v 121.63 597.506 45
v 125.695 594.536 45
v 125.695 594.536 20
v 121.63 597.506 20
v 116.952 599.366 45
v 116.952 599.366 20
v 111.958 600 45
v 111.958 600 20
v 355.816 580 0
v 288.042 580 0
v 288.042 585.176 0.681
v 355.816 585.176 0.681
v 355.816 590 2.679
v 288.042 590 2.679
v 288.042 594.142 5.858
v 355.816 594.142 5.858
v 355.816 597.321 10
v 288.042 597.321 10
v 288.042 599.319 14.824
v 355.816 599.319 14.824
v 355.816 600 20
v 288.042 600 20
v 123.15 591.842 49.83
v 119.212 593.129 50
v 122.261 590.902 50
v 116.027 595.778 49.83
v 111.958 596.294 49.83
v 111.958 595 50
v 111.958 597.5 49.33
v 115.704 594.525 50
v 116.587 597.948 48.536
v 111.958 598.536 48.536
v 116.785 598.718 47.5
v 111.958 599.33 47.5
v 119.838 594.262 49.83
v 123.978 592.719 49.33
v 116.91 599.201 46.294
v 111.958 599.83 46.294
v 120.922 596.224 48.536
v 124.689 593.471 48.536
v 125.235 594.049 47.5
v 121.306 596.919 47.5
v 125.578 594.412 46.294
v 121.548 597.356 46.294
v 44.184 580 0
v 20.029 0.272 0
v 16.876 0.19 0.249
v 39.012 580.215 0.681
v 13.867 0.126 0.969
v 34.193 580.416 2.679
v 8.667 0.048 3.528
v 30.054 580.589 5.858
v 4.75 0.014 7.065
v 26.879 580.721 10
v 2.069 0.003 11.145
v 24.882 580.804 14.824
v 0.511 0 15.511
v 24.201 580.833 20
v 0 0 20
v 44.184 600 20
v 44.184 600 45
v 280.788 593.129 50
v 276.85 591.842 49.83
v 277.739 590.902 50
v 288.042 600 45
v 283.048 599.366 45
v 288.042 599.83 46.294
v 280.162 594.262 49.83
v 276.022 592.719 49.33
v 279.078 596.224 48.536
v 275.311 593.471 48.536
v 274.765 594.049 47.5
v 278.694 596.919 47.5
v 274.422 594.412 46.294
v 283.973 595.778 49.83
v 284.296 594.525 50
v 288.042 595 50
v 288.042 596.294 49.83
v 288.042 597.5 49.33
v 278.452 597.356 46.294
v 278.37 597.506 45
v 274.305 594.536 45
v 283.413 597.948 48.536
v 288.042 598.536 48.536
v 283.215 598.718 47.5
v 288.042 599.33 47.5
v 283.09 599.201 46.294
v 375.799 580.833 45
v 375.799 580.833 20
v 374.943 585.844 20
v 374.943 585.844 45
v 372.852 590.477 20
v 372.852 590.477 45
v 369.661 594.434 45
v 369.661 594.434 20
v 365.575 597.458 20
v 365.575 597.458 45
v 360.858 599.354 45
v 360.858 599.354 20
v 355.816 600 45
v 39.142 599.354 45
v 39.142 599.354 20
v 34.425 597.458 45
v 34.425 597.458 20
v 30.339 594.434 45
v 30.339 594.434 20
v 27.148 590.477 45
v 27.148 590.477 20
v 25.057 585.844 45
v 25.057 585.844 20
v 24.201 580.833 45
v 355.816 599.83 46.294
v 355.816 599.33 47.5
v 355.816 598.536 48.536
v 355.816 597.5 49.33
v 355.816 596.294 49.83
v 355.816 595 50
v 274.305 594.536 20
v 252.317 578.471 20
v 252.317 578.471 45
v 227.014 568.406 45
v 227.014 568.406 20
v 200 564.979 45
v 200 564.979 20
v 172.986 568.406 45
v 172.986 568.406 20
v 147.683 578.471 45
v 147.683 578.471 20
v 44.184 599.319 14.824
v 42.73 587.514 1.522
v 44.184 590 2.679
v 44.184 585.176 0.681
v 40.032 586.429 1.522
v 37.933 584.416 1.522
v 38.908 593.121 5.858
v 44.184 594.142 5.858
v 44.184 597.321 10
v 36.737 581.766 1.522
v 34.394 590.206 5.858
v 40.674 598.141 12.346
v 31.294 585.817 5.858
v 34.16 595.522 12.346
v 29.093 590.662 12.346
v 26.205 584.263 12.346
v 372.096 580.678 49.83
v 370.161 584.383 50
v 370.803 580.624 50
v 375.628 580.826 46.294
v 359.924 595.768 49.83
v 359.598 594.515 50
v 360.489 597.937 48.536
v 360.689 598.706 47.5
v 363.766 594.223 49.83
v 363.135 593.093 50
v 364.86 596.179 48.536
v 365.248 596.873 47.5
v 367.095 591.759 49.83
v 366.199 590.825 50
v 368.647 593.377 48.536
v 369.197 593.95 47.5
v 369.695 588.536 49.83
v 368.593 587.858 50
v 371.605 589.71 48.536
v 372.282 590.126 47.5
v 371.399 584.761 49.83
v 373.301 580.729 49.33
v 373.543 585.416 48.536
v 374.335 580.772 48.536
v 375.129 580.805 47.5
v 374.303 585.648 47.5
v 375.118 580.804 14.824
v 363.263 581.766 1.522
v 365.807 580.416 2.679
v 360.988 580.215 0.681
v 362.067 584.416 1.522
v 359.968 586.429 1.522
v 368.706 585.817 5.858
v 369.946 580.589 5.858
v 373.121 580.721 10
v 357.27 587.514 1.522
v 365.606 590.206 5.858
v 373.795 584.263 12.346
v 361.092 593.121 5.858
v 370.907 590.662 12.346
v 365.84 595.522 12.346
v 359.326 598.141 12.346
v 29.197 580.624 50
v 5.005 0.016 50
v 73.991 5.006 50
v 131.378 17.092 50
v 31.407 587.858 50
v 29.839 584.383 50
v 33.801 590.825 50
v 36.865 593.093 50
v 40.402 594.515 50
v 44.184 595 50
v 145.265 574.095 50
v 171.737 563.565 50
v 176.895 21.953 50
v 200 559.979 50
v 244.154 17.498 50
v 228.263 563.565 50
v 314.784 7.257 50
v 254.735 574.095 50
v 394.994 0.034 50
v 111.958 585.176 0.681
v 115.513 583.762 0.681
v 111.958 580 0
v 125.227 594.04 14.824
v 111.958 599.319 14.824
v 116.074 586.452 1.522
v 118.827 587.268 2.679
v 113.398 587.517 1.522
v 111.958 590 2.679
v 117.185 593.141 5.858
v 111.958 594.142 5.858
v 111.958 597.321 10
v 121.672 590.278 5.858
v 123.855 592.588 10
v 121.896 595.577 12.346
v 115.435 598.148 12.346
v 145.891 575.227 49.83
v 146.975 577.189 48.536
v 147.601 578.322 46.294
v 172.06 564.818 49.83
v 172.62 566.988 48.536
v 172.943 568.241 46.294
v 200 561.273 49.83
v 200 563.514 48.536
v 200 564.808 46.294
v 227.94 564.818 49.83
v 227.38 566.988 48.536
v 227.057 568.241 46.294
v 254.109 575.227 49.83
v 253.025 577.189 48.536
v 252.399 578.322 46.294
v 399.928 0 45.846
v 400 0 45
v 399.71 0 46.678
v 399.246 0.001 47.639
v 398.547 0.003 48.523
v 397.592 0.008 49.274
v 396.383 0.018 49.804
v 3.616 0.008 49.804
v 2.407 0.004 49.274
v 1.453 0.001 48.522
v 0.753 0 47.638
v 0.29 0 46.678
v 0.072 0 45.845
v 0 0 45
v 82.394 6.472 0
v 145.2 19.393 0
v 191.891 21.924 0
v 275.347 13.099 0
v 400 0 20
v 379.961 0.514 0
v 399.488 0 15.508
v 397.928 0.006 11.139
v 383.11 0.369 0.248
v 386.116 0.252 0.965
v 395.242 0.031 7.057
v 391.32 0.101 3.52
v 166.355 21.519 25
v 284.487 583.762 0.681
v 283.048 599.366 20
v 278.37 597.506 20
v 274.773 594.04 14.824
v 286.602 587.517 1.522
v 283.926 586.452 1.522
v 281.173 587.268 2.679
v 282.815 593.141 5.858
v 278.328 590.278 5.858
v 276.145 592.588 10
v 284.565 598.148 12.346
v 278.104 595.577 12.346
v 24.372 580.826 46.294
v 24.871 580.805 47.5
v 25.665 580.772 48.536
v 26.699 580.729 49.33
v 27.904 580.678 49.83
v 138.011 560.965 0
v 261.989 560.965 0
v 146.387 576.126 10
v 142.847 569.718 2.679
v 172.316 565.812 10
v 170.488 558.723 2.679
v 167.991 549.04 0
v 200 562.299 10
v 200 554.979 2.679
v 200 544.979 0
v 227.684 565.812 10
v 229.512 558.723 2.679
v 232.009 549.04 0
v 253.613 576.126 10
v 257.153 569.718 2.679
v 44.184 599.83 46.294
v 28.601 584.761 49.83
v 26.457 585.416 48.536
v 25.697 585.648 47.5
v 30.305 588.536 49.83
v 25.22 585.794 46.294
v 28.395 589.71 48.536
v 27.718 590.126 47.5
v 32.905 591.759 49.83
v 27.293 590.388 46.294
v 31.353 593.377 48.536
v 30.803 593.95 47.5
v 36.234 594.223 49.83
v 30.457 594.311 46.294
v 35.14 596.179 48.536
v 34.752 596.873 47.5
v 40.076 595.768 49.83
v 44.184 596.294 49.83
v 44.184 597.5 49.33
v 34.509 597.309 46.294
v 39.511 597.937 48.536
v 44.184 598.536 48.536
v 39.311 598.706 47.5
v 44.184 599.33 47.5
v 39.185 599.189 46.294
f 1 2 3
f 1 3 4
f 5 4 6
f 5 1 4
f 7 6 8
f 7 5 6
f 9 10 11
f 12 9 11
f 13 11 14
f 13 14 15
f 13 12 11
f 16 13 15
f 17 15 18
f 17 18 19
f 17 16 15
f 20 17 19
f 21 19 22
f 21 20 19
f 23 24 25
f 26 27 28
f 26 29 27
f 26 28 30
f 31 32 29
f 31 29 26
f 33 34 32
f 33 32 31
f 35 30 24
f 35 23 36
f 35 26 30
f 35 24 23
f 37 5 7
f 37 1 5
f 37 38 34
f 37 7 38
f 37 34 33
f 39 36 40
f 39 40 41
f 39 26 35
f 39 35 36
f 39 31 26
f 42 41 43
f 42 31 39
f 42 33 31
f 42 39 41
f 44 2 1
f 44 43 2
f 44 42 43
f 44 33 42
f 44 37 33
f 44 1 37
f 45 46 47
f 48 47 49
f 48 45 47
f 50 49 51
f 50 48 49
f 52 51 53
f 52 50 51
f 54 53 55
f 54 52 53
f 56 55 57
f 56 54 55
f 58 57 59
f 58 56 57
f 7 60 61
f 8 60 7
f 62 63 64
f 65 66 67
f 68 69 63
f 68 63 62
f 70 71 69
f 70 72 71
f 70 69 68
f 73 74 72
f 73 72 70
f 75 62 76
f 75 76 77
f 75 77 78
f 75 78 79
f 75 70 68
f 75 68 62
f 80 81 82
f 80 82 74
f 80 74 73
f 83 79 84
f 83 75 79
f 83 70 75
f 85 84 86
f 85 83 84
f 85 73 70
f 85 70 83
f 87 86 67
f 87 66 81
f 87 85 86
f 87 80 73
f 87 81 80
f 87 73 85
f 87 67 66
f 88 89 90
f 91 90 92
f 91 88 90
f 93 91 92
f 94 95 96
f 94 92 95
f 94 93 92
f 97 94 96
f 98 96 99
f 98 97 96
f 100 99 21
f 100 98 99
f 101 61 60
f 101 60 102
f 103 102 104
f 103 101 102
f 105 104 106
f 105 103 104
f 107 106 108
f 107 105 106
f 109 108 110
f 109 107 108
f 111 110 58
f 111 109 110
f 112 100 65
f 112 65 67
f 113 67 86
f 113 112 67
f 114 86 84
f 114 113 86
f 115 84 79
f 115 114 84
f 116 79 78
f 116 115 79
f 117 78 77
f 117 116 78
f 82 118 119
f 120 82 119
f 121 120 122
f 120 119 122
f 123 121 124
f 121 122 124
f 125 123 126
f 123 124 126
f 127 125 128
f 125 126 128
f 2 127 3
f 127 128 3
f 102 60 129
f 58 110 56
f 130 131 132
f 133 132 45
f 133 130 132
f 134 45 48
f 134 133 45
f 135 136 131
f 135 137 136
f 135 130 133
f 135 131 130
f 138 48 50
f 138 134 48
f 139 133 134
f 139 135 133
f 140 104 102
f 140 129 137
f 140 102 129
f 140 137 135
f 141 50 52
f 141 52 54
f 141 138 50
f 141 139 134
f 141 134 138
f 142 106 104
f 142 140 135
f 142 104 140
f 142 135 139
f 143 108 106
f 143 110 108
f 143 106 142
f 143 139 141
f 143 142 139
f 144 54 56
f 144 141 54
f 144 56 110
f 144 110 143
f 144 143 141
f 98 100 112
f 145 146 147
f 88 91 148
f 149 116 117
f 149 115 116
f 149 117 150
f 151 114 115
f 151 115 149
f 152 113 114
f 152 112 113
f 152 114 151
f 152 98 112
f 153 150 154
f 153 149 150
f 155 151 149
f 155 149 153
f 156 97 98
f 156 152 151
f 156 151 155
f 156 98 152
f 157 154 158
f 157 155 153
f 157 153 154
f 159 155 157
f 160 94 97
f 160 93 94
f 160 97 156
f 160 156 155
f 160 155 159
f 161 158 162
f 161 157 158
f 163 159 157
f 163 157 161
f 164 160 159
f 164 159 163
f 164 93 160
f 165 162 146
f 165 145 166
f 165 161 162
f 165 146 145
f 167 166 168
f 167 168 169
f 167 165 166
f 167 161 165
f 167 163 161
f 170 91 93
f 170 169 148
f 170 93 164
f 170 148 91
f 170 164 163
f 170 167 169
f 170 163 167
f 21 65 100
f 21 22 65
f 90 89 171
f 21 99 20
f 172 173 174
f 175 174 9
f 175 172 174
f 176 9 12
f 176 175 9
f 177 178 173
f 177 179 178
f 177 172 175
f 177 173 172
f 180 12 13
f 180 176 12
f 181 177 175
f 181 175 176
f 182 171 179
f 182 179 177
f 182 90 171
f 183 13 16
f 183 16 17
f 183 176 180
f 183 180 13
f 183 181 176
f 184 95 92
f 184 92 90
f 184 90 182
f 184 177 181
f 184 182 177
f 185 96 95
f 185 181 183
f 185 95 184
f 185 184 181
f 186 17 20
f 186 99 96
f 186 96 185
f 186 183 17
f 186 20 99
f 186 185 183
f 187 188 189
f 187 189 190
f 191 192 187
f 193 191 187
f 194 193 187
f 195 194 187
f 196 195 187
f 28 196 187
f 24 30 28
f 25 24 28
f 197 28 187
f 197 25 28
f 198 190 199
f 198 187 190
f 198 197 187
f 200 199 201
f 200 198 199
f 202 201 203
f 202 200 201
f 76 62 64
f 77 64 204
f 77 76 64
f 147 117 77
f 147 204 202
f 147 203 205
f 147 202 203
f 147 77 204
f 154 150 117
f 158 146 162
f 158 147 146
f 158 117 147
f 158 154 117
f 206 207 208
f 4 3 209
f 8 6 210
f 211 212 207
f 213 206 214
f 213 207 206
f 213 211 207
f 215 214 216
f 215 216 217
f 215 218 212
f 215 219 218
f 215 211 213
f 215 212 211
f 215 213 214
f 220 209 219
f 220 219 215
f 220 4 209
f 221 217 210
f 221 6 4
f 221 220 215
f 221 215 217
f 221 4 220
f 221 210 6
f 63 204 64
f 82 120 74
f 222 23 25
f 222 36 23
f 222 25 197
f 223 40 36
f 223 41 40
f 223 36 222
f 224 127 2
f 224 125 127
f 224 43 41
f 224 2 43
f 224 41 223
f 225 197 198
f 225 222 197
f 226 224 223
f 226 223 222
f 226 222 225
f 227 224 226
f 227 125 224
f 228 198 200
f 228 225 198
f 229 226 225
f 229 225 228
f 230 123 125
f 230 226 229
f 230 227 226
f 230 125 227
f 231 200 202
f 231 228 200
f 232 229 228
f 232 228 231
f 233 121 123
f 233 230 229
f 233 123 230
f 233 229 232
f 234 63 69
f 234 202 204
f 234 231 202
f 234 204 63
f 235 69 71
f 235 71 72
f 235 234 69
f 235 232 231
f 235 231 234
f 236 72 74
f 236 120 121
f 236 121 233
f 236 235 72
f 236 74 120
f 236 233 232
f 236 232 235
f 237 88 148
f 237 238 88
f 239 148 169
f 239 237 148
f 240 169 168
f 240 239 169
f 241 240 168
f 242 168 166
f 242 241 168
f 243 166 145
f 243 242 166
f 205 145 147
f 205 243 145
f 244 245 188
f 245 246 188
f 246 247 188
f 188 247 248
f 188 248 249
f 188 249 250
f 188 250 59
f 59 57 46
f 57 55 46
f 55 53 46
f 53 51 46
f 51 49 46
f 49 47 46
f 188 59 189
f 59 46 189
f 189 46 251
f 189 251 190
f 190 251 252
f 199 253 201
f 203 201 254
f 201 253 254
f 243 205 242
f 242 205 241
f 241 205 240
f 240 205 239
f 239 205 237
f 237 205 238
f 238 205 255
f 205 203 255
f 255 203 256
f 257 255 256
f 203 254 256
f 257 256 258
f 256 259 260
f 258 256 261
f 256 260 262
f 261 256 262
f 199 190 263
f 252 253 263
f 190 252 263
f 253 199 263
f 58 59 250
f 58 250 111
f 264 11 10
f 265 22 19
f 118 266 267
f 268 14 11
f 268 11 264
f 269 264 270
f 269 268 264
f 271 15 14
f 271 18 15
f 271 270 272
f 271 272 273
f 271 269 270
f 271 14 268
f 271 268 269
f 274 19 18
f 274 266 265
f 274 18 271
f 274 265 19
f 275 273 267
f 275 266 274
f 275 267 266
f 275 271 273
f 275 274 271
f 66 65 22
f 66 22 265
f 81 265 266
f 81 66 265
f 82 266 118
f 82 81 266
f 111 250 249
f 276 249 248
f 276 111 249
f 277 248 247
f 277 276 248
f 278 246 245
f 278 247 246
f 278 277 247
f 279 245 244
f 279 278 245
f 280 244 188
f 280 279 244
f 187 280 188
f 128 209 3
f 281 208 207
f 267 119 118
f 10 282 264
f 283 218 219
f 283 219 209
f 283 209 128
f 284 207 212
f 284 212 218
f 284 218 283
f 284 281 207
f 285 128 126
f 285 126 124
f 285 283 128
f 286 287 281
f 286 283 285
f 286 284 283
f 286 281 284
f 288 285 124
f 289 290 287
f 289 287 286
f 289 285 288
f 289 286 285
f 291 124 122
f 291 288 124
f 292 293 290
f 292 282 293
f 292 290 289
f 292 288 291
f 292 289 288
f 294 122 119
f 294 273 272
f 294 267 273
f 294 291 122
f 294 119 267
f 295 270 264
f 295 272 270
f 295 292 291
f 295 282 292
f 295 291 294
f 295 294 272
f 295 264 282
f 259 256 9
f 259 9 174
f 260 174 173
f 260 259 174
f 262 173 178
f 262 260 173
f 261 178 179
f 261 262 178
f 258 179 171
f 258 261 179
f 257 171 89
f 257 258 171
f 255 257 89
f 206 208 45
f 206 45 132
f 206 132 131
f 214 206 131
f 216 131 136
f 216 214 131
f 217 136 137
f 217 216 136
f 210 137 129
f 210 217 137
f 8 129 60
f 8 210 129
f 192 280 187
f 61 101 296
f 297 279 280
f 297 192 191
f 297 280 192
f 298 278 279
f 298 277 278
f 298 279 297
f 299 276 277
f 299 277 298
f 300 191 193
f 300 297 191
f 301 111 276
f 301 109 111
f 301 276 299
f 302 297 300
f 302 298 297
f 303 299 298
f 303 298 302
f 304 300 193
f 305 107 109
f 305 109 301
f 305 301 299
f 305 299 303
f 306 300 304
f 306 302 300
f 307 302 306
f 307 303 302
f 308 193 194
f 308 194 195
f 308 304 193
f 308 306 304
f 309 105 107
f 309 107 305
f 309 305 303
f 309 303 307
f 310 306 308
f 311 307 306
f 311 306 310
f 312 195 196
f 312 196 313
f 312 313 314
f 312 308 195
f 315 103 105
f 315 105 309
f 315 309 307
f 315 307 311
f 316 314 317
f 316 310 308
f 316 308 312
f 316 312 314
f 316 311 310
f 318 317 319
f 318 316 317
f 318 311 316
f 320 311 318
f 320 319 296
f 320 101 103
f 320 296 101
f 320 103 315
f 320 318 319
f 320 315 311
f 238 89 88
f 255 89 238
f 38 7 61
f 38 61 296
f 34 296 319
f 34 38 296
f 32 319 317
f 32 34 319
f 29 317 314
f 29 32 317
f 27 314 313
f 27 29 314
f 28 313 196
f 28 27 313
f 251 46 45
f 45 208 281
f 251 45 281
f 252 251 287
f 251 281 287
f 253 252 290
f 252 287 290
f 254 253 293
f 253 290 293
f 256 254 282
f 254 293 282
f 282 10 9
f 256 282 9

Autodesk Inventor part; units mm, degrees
ref_plane "YZ Plane" through (0, 0, 0) normal (1, 0, 0) x (0, 1, 0)
ref_plane "XZ Plane" through (0, 0, 0) normal (0, 1, 0) x (-1, 0, 0)
ref_plane "XY Plane" through (0, 0, 0) normal (0, 0, 1) x (1, 0, 0)
sketch "Sketch1" plane through (0, 0, 0) normal (0, 0, 1) x (1, 0, 0)
  line L0 (0, 0) -> (25, 600)
  line L1 (25, 600) -> (375, 600)
  line L2 (375, 600) -> (400, 0)
  line L3 (400, 0) -> (0, 0)
  line L4 (0, 0) -> (76.2678, 0) construction
  line L5 (76.2678, 0) -> (120.3096, 19.0389) construction
  line L6 (120.3096, 19.0389) -> (188.6298, 38.3438) construction
  line L7 (188.6298, 38.3438) -> (327.7567, 0) construction
  line L8 (327.7567, 0) -> (400, 0) construction
  spline S0 degree 4 poles (0, 0) (76.2678, 0) (120.3096, 19.0389) (188.6298, 38.3438) (327.7567, 0) (400, 0) knots 1 1 1 1 1 2 3 3 3 3 3
  arc A0 (120.3096, 600) -> (279.6904, 600) centre (200, 673.1568) ccw
  line L9 (120.3096, 600) -> (25, 600)
  line L10 (25, 600) -> (0, 0)
  dimension "d0" = 600
  dimension "d1" = 25
  dimension "d2" = 350
  dimension "d3" = 400
  dimension "d4" = 175
extrude "Extrusion1" add sketch "Sketch1" along normal blind 50 contours L0 L1 A0 L2 S0
fillet "Fillet1" radius 20 9 edges at (327.3452, 600, 0) (387.5, 300, 0) (200, 564.9788, 0) (72.6548, 600, 0) (12.5, 300, 0) (25, 600, 25) (120.3096, 600, 25) (279.6904, 600, 25) (375, 600, 25)
fillet "Fillet2" radius 5 9 edges at (78.071, 600, 50) (119.3501, 598.5837, 50) (200, 564.9788, 50) (280.6499, 598.5837, 50) (321.929, 600, 50) (369.6606, 594.4335, 50) (387.8993, 290.4163, 50) (12.1007, 290.4163, 50) (30.3394, 594.4335, 50)
properties part number "backrest wheelchair EG26"
